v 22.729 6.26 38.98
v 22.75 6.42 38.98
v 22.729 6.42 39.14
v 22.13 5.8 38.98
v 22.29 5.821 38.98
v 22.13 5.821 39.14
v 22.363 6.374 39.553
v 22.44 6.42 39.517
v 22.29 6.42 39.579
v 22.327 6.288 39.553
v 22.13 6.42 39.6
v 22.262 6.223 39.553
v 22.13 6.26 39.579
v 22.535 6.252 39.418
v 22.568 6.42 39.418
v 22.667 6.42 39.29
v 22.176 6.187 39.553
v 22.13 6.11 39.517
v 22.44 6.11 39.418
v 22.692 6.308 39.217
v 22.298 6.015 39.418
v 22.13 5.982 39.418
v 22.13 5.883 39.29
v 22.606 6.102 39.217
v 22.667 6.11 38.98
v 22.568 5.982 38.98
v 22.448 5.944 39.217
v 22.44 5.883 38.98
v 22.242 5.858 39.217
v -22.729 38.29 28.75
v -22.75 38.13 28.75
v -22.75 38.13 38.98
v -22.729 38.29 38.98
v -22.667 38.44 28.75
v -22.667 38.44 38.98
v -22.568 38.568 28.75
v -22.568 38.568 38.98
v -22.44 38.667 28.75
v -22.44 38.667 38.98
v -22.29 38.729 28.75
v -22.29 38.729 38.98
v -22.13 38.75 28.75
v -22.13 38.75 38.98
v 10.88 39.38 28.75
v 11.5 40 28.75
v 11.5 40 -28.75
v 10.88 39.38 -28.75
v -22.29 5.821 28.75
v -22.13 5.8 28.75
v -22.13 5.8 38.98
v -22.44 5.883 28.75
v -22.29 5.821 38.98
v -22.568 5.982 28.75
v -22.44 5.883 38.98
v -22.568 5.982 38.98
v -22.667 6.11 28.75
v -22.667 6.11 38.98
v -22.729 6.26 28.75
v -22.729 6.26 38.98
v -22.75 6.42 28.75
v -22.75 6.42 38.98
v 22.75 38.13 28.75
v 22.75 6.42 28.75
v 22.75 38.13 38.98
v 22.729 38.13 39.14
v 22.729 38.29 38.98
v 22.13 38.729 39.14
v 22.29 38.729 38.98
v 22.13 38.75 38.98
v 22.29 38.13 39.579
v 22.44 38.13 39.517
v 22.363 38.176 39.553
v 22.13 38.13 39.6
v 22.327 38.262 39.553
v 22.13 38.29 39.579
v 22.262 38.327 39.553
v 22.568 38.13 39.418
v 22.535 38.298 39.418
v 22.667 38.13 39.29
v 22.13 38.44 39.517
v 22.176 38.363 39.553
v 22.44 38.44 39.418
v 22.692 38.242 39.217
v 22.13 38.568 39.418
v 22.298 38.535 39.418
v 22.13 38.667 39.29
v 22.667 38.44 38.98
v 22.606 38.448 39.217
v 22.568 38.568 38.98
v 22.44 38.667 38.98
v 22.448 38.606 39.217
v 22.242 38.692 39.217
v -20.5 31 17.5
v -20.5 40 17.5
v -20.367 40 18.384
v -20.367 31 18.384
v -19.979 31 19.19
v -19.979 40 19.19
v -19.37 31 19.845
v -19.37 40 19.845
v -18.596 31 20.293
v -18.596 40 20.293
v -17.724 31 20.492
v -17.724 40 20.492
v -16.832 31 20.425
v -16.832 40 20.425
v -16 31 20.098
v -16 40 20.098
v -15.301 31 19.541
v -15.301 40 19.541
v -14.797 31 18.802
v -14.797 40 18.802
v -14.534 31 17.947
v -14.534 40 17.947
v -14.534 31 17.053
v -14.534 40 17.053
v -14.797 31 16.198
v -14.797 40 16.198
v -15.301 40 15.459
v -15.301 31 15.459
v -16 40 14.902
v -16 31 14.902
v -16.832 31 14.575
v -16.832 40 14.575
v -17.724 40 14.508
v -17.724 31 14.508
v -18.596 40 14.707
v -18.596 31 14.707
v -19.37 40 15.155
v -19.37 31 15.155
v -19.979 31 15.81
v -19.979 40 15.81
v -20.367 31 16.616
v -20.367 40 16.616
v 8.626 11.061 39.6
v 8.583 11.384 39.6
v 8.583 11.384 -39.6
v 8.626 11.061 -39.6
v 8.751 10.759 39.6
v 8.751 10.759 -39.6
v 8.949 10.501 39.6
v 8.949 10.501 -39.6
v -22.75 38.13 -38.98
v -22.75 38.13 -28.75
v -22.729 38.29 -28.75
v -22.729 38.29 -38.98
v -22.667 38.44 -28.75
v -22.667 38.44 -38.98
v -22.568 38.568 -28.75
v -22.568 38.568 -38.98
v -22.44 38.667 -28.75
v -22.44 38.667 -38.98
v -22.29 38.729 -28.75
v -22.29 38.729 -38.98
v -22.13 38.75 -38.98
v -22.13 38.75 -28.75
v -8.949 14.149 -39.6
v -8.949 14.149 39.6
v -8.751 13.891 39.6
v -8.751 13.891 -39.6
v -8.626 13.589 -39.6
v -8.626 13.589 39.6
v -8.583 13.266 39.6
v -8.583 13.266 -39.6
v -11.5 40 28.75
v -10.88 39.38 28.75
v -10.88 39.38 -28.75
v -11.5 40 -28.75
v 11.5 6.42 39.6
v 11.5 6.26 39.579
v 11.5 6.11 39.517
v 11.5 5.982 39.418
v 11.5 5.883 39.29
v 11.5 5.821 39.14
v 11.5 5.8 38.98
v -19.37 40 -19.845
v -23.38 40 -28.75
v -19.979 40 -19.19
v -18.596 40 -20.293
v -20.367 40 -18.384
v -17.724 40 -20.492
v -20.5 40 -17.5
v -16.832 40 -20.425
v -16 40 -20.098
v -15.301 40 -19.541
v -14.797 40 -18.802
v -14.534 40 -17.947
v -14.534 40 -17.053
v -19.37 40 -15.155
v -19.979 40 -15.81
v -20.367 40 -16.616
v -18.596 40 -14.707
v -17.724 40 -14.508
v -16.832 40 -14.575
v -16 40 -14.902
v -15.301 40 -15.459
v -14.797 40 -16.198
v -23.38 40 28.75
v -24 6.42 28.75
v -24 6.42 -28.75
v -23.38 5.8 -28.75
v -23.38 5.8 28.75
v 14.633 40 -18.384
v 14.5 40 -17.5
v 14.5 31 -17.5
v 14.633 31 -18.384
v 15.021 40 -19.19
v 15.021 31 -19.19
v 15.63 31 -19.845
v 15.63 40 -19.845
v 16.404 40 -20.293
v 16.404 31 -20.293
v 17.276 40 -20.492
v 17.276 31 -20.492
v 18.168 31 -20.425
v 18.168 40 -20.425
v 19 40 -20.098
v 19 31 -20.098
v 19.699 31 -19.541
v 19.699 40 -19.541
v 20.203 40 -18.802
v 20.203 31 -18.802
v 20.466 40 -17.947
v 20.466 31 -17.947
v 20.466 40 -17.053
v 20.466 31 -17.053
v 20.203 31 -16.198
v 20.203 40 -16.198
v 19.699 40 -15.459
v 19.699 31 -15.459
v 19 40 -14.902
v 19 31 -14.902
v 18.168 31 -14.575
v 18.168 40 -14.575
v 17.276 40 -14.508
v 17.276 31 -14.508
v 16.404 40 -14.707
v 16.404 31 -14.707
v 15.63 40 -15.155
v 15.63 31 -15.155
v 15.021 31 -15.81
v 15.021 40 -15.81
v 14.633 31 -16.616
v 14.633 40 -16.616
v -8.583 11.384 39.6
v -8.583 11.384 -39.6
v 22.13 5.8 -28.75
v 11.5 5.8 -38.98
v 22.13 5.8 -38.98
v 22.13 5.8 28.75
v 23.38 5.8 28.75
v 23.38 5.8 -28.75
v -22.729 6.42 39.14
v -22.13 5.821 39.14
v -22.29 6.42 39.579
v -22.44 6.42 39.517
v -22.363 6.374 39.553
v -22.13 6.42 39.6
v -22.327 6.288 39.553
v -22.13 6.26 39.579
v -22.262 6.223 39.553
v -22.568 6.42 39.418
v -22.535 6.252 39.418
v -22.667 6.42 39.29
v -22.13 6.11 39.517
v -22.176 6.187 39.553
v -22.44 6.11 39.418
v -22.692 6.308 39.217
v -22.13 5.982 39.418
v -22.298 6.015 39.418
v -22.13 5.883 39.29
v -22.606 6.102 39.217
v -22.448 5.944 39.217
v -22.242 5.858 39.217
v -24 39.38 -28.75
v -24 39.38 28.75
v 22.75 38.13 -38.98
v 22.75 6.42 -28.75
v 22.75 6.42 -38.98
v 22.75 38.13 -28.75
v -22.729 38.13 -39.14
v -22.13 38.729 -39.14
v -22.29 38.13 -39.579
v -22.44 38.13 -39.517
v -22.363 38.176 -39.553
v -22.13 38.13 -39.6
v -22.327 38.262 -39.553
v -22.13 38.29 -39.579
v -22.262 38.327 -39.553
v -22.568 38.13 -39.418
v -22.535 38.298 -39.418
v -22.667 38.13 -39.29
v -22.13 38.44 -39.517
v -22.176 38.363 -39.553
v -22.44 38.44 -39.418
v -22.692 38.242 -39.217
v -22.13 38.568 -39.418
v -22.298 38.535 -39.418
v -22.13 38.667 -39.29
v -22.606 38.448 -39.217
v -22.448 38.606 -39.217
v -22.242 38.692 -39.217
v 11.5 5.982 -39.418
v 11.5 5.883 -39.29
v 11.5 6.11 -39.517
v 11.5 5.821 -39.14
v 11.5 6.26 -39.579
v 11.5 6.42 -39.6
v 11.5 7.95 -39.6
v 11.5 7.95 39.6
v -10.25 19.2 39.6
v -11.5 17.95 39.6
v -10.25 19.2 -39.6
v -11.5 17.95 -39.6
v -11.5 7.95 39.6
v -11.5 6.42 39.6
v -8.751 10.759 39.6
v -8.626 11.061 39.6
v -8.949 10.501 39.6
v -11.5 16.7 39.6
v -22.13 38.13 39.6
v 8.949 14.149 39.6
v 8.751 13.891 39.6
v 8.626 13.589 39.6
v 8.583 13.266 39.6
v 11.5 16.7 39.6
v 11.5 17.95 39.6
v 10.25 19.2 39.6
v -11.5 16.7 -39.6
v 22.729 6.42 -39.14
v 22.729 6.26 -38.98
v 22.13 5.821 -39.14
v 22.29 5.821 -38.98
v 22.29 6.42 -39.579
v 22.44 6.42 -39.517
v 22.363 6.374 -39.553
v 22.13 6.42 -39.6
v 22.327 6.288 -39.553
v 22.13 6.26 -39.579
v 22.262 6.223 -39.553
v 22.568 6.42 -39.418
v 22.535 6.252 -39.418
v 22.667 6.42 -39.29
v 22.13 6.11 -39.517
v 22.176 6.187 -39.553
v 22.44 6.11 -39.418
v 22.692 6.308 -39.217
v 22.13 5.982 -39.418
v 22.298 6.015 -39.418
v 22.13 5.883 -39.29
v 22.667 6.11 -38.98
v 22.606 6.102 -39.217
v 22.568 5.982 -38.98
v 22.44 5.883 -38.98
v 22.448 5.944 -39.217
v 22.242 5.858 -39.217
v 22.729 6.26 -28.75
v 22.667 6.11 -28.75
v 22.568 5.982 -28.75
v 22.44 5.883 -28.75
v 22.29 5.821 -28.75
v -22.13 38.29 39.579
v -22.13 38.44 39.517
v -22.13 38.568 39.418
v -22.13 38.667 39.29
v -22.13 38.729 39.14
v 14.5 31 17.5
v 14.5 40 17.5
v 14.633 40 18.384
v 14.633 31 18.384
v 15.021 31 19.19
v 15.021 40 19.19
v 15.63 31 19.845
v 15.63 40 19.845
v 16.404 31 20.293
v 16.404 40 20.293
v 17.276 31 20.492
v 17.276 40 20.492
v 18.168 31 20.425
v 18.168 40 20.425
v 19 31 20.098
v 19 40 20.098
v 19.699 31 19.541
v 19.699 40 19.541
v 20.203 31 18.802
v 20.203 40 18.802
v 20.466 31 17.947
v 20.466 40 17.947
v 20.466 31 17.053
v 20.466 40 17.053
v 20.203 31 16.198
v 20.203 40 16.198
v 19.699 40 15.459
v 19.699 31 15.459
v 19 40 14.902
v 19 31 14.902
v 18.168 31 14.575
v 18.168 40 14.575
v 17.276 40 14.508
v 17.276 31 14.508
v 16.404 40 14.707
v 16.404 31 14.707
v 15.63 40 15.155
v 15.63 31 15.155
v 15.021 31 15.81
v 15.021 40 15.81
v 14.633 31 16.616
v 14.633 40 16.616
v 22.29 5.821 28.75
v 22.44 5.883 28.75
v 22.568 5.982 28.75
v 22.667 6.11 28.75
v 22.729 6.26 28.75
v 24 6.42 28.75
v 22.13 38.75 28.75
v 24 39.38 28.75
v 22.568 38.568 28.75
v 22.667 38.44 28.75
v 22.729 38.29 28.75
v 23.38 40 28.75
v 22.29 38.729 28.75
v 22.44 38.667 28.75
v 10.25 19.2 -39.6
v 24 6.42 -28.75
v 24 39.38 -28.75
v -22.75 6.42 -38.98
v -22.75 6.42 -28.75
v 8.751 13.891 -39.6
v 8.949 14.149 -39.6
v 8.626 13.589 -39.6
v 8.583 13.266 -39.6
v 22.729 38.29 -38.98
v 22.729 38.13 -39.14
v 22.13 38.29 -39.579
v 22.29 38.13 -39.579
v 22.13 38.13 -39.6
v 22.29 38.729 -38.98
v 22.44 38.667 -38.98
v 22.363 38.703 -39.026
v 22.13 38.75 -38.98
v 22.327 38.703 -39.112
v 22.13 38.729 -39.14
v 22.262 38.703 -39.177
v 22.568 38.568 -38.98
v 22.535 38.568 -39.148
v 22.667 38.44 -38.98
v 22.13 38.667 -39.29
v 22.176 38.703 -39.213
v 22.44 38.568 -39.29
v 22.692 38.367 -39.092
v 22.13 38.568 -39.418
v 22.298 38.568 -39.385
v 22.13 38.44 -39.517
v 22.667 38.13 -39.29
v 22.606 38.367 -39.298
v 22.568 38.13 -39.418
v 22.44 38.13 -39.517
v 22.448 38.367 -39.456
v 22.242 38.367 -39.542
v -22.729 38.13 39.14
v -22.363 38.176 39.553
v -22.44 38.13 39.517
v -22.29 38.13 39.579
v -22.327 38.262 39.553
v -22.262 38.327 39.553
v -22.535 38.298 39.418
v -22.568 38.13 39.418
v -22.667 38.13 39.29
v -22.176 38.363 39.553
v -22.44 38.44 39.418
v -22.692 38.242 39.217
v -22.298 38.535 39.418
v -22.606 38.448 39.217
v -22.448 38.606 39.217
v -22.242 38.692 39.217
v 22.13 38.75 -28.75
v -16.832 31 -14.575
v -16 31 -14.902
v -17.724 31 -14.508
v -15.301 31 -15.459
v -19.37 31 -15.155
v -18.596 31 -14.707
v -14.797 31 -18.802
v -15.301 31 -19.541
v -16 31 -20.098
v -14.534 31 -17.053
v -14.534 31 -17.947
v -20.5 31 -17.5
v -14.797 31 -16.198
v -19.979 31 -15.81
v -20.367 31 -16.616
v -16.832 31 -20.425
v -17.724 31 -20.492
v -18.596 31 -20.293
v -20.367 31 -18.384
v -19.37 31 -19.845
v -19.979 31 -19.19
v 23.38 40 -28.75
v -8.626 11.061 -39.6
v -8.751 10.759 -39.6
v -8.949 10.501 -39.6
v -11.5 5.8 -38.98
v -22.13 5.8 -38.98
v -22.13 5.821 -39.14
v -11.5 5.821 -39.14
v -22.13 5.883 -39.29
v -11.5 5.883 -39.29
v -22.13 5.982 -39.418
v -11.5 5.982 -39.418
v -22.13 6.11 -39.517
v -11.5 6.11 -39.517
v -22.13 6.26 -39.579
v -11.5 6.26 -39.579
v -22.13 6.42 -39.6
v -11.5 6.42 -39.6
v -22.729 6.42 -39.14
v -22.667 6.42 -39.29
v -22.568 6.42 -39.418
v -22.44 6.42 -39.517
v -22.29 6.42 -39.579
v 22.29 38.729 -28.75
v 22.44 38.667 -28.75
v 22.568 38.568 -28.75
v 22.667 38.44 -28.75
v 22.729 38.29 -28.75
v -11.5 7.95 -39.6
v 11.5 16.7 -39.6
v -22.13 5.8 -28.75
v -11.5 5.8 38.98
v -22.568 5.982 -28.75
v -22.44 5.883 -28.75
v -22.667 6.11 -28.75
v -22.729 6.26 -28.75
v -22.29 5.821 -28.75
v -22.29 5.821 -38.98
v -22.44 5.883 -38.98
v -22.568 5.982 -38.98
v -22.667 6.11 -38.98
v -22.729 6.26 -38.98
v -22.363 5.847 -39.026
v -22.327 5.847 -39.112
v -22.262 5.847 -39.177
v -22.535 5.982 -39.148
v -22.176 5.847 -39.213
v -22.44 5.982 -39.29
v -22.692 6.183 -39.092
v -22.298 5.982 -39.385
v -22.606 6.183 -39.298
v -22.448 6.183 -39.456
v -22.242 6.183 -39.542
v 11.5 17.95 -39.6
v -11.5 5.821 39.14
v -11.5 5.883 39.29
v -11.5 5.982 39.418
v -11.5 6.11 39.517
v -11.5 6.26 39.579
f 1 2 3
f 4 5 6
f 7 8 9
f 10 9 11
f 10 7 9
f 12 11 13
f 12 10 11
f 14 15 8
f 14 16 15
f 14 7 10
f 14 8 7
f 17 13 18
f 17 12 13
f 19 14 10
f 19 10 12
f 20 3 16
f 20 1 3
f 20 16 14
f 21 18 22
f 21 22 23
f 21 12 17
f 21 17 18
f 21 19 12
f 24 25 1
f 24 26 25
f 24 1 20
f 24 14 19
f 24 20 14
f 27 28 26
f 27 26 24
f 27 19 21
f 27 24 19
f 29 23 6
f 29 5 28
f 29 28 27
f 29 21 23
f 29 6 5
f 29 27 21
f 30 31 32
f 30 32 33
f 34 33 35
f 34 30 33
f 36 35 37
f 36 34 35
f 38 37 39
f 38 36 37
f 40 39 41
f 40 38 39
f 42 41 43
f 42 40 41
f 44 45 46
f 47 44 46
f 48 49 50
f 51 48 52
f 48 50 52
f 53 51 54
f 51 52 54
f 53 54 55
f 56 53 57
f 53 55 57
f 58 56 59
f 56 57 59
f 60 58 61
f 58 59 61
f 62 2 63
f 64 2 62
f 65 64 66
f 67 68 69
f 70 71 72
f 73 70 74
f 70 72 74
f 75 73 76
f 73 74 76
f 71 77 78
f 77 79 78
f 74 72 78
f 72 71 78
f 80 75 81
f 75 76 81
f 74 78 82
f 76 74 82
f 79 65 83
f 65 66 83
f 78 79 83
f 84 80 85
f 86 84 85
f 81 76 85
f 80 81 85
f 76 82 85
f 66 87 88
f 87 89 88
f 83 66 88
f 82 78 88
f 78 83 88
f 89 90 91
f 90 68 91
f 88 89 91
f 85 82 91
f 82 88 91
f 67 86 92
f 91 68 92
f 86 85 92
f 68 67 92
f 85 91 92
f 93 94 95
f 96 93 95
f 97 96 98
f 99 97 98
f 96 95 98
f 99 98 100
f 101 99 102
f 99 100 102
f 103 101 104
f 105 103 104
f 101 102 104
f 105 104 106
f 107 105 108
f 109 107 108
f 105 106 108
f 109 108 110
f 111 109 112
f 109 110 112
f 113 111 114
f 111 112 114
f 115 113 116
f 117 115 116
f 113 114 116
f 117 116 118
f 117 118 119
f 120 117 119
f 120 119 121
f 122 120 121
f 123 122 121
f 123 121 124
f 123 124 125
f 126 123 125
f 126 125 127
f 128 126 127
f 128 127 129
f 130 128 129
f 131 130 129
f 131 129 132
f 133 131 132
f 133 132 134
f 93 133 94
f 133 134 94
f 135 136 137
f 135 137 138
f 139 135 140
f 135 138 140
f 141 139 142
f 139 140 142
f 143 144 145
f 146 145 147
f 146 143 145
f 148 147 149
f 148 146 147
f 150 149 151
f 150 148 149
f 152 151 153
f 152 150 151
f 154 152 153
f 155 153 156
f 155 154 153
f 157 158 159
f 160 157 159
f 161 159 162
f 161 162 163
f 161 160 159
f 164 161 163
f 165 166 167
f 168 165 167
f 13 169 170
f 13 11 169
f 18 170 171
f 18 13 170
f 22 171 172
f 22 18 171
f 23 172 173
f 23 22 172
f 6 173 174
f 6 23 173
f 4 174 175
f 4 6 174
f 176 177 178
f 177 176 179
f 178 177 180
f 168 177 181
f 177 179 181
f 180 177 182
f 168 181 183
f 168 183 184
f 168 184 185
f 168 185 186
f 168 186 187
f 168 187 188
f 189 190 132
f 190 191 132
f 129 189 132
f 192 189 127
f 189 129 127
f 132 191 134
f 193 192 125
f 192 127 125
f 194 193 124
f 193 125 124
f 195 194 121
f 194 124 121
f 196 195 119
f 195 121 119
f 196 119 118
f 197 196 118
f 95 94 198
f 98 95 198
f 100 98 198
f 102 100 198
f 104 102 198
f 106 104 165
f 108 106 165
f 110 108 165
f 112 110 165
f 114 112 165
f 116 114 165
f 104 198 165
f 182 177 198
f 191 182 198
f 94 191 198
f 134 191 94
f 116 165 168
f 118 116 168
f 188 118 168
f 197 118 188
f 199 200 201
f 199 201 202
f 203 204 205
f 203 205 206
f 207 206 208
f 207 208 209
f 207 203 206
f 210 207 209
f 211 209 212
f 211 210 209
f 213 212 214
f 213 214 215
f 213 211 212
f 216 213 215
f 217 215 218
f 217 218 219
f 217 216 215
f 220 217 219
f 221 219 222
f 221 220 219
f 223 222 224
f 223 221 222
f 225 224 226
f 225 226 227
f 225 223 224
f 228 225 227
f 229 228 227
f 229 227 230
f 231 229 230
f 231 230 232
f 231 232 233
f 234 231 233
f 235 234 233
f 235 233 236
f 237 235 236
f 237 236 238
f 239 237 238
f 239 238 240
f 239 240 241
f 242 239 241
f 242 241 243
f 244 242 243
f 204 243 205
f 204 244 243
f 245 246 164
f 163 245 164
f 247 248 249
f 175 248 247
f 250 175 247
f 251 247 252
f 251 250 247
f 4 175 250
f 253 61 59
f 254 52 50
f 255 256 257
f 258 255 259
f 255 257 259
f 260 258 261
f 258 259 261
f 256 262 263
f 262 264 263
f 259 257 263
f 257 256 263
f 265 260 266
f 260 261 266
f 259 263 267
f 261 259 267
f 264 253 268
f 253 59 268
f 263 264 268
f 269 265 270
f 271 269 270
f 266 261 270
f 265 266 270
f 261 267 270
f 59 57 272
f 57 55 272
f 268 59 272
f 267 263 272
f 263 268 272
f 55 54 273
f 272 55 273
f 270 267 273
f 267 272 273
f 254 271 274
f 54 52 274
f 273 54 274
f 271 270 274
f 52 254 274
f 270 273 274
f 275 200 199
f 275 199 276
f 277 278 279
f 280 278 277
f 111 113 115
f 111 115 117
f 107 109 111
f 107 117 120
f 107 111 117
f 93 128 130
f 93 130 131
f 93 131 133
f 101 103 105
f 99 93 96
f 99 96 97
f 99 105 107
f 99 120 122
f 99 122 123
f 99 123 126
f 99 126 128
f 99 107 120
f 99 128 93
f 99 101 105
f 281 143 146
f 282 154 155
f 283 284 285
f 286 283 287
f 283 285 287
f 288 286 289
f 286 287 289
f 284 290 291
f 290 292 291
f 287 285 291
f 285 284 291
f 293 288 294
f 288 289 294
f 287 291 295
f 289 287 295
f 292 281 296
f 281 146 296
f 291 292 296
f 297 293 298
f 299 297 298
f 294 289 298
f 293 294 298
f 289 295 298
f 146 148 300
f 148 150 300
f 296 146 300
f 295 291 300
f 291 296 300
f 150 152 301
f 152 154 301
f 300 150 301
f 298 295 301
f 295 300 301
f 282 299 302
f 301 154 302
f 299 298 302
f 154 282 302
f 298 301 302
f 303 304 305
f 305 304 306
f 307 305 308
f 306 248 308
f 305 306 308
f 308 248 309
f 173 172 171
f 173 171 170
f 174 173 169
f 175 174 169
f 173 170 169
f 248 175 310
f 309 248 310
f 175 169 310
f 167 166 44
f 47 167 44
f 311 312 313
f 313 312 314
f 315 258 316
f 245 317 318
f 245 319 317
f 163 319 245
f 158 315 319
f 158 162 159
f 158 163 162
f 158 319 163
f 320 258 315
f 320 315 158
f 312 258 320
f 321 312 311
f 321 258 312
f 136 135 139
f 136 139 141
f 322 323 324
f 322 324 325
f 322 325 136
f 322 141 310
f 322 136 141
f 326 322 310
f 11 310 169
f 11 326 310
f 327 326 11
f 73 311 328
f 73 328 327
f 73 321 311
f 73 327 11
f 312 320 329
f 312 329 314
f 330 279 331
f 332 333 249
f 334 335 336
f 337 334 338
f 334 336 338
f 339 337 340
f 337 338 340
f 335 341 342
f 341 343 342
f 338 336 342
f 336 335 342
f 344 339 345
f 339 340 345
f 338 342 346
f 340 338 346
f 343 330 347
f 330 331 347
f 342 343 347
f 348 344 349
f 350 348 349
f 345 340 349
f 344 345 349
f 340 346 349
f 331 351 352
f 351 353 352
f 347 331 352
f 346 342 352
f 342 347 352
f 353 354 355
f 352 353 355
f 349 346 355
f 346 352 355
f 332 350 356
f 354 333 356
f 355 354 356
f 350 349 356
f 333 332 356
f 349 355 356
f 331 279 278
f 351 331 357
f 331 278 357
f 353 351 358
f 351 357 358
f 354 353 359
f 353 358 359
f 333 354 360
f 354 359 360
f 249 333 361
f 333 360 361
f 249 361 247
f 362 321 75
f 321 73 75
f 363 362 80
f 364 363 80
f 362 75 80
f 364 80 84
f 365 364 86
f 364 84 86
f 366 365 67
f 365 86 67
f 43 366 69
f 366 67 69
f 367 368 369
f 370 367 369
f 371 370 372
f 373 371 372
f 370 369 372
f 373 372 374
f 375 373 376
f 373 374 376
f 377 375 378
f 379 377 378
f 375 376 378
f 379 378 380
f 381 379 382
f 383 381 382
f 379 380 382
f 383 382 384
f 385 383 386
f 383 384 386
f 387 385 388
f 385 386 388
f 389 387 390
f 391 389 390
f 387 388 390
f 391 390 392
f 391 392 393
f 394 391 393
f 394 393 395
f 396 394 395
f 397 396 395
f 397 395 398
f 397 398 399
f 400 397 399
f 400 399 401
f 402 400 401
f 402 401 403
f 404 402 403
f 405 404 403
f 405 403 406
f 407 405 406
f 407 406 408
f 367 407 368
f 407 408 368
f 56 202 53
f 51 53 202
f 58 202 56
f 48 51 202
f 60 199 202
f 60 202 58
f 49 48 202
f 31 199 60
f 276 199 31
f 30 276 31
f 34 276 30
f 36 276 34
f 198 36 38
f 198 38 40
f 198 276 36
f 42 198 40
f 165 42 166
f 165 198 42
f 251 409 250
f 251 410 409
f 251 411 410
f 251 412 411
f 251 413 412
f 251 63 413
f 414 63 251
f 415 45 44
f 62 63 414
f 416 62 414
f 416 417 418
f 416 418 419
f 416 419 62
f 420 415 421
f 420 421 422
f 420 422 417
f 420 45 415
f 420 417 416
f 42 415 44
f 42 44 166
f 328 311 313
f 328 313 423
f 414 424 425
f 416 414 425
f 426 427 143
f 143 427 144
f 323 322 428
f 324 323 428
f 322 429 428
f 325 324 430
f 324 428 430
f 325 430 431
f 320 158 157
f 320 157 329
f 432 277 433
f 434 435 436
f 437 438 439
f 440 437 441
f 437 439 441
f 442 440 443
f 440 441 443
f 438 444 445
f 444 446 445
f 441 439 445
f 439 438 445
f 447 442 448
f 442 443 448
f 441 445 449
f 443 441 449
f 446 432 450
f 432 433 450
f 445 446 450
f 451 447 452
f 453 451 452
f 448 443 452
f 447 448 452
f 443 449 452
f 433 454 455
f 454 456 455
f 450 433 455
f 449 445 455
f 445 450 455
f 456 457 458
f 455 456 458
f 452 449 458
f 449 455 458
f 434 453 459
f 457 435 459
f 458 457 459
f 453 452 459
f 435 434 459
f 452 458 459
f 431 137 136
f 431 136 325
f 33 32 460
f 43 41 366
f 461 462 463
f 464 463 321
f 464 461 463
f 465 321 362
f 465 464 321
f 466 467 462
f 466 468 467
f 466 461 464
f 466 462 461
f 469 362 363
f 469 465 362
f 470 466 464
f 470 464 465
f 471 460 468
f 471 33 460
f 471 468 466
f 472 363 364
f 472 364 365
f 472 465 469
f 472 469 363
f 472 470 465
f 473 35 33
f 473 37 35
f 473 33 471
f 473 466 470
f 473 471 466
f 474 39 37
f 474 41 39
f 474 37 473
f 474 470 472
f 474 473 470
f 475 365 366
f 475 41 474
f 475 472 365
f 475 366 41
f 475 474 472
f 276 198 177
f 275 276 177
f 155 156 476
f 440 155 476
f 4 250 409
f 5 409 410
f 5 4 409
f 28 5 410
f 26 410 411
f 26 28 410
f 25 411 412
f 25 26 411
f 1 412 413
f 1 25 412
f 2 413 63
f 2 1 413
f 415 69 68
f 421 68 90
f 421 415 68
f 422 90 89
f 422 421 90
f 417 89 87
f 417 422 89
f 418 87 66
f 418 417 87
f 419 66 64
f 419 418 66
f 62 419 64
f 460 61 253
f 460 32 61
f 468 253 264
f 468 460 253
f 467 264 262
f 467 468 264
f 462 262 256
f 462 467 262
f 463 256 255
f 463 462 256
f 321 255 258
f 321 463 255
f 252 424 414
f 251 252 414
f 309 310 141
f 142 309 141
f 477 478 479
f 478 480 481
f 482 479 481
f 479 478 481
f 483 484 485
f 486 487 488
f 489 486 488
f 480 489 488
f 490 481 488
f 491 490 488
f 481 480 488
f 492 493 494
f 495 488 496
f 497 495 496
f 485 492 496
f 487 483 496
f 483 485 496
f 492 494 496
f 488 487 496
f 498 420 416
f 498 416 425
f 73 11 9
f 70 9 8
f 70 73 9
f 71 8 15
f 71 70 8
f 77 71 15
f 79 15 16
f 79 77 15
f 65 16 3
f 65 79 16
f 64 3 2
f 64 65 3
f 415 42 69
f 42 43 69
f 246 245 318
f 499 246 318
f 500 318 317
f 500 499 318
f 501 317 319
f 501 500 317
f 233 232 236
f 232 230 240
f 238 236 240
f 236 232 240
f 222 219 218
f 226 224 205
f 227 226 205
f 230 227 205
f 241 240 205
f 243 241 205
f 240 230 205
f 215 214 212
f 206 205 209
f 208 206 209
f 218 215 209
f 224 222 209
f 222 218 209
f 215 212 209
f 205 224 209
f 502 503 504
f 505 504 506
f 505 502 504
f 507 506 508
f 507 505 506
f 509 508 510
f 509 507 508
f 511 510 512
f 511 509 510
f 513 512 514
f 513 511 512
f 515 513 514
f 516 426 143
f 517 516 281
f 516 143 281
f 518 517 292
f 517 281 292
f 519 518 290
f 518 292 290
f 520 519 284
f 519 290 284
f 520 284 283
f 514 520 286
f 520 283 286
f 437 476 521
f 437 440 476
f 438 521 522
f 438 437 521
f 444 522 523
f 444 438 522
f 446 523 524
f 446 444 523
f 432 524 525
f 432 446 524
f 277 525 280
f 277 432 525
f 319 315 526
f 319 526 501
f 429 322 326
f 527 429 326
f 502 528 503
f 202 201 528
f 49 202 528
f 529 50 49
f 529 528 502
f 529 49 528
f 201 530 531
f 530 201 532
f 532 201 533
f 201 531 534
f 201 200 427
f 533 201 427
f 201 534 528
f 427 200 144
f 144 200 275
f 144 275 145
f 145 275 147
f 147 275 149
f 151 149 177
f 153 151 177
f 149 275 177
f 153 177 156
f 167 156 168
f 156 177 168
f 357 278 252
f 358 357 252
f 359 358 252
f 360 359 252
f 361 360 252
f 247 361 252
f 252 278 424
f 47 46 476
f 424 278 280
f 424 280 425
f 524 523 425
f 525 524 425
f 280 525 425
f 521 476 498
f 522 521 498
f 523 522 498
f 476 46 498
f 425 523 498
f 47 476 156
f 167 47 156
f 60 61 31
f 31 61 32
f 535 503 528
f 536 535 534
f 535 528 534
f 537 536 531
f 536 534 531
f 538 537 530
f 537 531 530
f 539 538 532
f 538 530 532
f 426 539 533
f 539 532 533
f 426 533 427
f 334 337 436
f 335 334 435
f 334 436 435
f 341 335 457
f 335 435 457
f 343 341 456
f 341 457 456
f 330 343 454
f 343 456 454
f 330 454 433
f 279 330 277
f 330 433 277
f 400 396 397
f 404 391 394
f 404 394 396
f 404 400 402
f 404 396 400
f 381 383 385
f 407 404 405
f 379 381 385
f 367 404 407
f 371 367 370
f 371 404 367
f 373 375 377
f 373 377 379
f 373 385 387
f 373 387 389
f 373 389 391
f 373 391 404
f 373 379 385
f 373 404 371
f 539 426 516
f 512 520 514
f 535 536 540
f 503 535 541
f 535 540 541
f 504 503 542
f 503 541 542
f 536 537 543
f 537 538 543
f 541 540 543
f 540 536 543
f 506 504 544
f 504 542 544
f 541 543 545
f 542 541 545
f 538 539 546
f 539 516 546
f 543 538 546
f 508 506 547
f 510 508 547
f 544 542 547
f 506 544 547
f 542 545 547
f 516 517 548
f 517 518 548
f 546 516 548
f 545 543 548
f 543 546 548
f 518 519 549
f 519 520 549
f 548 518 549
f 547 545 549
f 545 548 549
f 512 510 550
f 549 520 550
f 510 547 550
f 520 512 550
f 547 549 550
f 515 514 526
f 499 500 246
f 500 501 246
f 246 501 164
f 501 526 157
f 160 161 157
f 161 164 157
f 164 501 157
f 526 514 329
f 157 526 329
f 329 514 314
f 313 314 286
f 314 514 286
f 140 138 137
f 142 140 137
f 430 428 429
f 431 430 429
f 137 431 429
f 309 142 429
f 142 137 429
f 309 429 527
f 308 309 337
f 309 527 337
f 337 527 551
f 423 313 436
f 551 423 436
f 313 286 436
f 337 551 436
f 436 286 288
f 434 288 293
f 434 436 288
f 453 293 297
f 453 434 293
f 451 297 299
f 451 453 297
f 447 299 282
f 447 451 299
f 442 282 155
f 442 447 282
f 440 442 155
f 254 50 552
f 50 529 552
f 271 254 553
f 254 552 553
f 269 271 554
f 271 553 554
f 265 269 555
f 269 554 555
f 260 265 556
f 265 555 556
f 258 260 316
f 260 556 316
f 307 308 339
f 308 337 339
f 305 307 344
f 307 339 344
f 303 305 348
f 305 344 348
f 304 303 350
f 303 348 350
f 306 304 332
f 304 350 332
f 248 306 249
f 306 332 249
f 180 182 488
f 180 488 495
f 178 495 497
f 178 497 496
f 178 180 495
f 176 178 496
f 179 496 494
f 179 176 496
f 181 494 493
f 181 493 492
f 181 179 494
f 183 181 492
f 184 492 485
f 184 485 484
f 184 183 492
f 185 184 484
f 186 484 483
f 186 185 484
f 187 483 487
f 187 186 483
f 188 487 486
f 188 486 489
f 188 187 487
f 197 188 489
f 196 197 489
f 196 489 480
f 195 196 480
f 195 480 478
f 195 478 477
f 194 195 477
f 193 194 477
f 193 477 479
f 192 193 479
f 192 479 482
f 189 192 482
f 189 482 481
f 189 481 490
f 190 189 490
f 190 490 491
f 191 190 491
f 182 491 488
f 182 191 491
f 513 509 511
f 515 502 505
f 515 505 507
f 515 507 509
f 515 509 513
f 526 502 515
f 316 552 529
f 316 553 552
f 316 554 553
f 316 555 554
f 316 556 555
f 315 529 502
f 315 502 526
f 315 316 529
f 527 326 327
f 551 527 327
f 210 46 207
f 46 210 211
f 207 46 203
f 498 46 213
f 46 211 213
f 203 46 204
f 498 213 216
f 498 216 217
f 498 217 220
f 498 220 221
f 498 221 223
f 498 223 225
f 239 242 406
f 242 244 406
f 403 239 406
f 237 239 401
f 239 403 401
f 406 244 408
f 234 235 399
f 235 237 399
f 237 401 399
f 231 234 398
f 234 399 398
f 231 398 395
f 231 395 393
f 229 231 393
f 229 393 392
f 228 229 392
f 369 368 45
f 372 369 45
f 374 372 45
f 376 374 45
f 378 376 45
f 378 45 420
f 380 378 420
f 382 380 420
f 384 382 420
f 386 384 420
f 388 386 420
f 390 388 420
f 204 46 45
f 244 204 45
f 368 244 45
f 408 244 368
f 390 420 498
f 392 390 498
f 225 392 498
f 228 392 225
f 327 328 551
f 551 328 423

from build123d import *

# Parameters (mm, degrees)
SKETCH1_W           = 48
SKETCH1_H           = 34.2
BOSS_EXTRUDE1_DEPTH = 28.75
SKETCH2_W           = 45.5
SKETCH2_H           = 32.95
BOSS_EXTRUDE2_DEPTH = 39.6
SKETCH3_W           = 23
SKETCH3_H           = 19.2
CUT_EXTRUDE1_DEPTH  = 92.916483832
BOSS_EXTRUDE3_DEPTH = 79.2
CHAMFER1_SIZE       = 1.25
FILLET1_R           = 1.25
SKETCH5_W           = 23
SKETCH5_H           = 0.62
CUT_EXTRUDE2_DEPTH  = 83.750966762
CHAMFER2_SIZE       = 0.62
FILLET2_R           = 0.62
SKETCH6_R           = 3
CUT_EXTRUDE3_DEPTH  = 9


with BuildPart() as part:
    # Sketch1 → Boss-Extrude1 (new, symmetric)
    with BuildSketch(Plane.XY):
        with Locations((0, 22.9)):
            Rectangle(SKETCH1_W, SKETCH1_H)
    extrude(amount=BOSS_EXTRUDE1_DEPTH, both=True)

    # Sketch2 → Boss-Extrude2 (add, symmetric)
    with BuildSketch(Plane.XY):
        with Locations((0, 22.275)):
            Rectangle(SKETCH2_W, SKETCH2_H)
    extrude(amount=BOSS_EXTRUDE2_DEPTH, both=True)

    # Sketch3 → Cut-Extrude1 (cut, through all)
    with BuildSketch(Plane.XY.offset(39.6)):
        with Locations((0, 9.6)):
            Rectangle(SKETCH3_W, SKETCH3_H)
    extrude(amount=-CUT_EXTRUDE1_DEPTH, mode=Mode.SUBTRACT)

    # Sketch4 → Boss-Extrude3 (add)
    with BuildSketch(Plane.XY.offset(39.6)):
        Polygon((-11.5, 16.7), (-11.5, 7.95), (-8.583333333, 10.866666667), (-8.583333333, 13.783333333), align=None)
        Polygon((8.583333333, 13.783333333), (11.5, 16.7), (11.5, 7.95), (8.583333333, 10.866666667), align=None)
    extrude(amount=-BOSS_EXTRUDE3_DEPTH)

    # Chamfer1
    chamfer1_edges = [part.edges().sort_by_distance(p)[0] for p in [
        (11.5, 19.2, 0),
        (-11.5, 19.2, 0),
    ]]
    chamfer(chamfer1_edges, length=CHAMFER1_SIZE)

    # Fillet1
    fillet1_edges = [part.edges().sort_by_distance(p)[0] for p in [
        (-8.583333333, 10.866666667, 0),
        (-8.583333333, 13.783333333, 0),
        (8.583333333, 13.783333333, 0),
        (8.583333333, 10.866666667, 0),
    ]]
    fillet(fillet1_edges, radius=FILLET1_R)

    # Sketch5 → Cut-Extrude2 (cut, through all)
    with BuildSketch(Plane.XY.offset(28.75)):
        with Locations((0, 39.69)):
            Rectangle(SKETCH5_W, SKETCH5_H)
    extrude(amount=-CUT_EXTRUDE2_DEPTH, mode=Mode.SUBTRACT)

    # Chamfer2
    chamfer2_edges = [part.edges().sort_by_distance(p)[0] for p in [
        (-11.5, 39.38, 0),
        (11.5, 39.38, 0),
        (24, 5.8, 0),
        (-24, 5.8, 0),
        (-24, 40, 0),
        (24, 40, 0),
    ]]
    chamfer(chamfer2_edges, length=CHAMFER2_SIZE - 0.0001)  # a hair under: the kernel refuses the full size

    # Fillet2
    fillet2_edges = [part.edges().sort_by_distance(p)[0] for p in [
        (-22.75, 38.75, 34.175),
        (-22.75, 5.8, 34.175),
        (22.75, 5.8, 34.175),
        (22.75, 38.75, 34.175),
        (-22.75, 38.75, -34.175),
        (-22.75, 22.275, -39.6),
        (-22.75, 5.8, -34.175),
        (-17.125, 5.8, -39.6),
        (22.75, 5.8, -34.175),
        (22.75, 22.275, -39.6),
        (22.75, 38.75, -34.175),
        (0, 38.75, -39.6),
        (-22.75, 22.275, 39.6),
        (-17.125, 5.8, 39.6),
        (22.75, 22.275, 39.6),
        (0, 38.75, 39.6),
        (17.125, 5.8, 39.6),
        (17.125, 5.8, -39.6),
    ]]
    fillet(fillet2_edges, radius=FILLET2_R)

    # Sketch6 → Cut-Extrude3 (cut)
    with BuildSketch(Plane(origin=(0, 40, 0), x_dir=(1, 0, 0), z_dir=(0, 1, 0))):
        with Locations(Location((-17.5, -17.5, 0), (0, 0, 180))):
            Circle(SKETCH6_R)
        with Locations(Location((17.5, -17.5, 0), (0, 0, 180))):
            Circle(SKETCH6_R)
    cut_extrude3 = extrude(amount=-CUT_EXTRUDE3_DEPTH, mode=Mode.SUBTRACT)

    # Mirror1: Cut-Extrude3 across plane
    add(cut_extrude3.mirror(Plane.XY), mode=Mode.SUBTRACT)


solid = part.part
